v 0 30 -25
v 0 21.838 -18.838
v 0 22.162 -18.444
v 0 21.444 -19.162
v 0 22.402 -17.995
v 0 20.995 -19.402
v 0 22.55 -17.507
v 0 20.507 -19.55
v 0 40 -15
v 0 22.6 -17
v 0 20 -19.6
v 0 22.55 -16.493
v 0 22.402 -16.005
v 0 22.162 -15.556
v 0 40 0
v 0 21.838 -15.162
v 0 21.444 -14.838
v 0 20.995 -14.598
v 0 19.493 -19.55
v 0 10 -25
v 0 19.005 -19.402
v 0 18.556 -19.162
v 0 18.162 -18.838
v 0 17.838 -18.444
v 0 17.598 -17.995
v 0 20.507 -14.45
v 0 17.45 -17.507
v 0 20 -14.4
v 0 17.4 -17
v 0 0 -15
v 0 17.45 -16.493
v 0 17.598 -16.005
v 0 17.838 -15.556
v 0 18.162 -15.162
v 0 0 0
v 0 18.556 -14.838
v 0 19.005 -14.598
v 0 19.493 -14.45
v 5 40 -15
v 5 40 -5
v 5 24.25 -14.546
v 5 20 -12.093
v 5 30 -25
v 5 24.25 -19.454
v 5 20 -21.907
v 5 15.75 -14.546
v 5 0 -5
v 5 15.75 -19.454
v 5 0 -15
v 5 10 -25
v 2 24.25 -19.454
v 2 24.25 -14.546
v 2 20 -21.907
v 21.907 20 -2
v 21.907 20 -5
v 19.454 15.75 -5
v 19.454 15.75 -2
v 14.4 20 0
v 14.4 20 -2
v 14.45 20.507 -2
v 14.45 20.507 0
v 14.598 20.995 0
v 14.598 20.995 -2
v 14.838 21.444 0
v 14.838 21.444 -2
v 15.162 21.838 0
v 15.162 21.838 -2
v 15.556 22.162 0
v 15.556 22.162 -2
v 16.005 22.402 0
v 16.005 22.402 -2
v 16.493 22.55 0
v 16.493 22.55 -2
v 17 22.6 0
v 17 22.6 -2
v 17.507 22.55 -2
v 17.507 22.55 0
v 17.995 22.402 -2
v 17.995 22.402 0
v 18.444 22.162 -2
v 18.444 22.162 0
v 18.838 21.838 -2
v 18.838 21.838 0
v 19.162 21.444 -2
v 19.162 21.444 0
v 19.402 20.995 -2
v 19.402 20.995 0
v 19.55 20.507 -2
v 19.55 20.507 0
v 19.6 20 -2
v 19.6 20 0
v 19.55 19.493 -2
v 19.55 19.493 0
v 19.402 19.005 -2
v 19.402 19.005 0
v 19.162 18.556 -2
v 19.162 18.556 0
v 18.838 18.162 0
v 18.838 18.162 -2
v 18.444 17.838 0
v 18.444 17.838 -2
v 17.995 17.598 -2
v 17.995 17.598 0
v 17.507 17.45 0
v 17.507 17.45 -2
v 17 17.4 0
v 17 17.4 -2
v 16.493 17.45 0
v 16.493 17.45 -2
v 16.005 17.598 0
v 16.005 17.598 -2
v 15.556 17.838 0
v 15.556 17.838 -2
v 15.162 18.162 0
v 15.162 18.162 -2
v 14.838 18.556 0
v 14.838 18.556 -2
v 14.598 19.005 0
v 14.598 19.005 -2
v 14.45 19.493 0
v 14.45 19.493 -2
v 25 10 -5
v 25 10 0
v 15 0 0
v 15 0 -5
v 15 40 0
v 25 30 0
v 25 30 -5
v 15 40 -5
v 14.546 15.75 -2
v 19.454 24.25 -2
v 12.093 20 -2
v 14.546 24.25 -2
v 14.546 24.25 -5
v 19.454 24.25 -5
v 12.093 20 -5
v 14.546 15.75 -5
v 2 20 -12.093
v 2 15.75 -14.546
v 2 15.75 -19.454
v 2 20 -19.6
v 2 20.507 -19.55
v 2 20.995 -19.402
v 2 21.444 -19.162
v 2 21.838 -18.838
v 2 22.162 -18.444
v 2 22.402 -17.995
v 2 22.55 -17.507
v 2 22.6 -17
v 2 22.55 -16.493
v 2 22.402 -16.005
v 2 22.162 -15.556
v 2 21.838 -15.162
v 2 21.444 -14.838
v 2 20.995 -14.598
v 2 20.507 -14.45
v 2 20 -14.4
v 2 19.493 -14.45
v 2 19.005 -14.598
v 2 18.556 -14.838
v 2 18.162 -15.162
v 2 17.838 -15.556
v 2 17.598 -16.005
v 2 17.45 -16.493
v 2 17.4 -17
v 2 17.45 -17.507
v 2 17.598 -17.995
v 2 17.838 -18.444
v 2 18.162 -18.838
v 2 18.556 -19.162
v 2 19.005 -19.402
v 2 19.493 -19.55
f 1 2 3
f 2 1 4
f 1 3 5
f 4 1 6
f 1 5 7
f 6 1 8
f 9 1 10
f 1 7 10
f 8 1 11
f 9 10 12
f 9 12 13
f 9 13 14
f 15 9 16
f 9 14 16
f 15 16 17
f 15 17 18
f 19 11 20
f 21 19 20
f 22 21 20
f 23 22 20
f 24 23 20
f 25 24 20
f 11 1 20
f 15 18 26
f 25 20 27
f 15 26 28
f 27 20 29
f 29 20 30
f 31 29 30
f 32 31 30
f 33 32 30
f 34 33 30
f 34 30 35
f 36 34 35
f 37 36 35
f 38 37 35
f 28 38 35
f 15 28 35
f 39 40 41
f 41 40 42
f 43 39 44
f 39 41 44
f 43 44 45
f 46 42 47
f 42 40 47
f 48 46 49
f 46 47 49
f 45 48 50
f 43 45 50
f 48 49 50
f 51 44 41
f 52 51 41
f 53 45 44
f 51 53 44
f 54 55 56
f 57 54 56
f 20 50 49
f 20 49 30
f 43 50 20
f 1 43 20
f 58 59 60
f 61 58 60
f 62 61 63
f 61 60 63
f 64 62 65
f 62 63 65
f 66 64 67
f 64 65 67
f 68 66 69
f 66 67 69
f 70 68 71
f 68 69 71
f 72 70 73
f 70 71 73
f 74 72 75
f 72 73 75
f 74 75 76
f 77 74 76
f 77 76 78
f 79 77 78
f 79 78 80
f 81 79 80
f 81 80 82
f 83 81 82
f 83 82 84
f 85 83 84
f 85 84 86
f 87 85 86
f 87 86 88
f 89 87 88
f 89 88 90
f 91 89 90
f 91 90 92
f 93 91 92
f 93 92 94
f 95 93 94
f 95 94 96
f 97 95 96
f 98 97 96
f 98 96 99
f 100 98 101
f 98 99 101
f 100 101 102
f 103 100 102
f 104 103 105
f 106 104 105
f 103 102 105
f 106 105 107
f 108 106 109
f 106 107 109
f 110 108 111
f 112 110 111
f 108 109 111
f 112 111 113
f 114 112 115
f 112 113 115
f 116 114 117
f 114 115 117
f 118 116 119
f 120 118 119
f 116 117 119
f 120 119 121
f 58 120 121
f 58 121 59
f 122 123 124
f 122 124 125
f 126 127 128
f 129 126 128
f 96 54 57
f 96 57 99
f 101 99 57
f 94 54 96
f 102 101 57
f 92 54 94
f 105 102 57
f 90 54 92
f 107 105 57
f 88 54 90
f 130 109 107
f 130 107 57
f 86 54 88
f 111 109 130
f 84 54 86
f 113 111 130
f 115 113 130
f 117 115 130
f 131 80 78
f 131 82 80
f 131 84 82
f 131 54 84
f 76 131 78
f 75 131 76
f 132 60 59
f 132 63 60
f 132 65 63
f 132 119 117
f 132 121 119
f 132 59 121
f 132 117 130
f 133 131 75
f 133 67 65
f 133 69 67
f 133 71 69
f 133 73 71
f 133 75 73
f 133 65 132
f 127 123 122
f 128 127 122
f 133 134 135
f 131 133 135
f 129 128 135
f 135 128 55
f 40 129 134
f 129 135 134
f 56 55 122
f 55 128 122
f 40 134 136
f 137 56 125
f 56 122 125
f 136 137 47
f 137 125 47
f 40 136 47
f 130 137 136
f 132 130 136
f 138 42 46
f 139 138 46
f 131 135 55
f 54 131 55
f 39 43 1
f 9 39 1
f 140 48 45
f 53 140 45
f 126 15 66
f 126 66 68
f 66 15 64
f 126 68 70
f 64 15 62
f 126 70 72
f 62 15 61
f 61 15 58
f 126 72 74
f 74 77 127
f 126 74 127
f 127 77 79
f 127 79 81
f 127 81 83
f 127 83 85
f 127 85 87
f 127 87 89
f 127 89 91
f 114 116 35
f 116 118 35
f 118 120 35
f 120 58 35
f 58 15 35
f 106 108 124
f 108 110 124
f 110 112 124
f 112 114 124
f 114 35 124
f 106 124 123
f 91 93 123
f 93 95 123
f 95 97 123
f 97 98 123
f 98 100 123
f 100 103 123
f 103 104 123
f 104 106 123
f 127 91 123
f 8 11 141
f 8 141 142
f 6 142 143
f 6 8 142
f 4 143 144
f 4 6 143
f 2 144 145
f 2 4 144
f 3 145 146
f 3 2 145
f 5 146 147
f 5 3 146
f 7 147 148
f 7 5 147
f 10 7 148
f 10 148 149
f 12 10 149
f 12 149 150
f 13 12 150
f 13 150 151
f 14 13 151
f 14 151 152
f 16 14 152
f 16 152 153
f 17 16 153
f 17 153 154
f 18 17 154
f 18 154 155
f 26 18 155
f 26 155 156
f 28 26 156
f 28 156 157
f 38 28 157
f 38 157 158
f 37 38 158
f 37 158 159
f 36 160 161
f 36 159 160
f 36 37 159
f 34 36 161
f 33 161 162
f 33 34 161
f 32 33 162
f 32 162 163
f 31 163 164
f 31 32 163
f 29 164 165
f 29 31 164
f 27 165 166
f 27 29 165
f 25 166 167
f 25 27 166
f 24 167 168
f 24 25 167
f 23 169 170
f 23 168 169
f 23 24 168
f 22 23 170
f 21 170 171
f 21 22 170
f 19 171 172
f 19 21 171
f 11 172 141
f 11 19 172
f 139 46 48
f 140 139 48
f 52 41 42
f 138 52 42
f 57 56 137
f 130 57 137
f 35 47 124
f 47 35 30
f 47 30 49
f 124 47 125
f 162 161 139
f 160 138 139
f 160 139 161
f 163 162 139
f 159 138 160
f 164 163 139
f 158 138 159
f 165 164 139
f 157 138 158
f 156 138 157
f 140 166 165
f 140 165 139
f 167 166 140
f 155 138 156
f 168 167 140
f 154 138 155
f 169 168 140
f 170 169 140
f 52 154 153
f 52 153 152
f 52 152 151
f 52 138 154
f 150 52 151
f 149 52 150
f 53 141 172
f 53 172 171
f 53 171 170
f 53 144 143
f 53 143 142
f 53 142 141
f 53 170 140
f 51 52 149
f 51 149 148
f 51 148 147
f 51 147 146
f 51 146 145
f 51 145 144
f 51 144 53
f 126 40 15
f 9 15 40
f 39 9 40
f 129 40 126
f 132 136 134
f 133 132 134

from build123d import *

# Parameters (mm, degrees)
BOSS_EXTRUDE1_DEPTH     = 40
SKETCH2_R               = 2.6
CUT_EXTRUDE1_DEPTH      = 40
CUT_EXTRUDE2_DEPTH      = 3
CUT_EXTRUDE3_DEPTH      = 52.23475383
CUT_EXTRUDE3_DEPTH_BACK = 52.23475383
SKETCH4_R               = 2.6
CUT_EXTRUDE4_DEPTH      = 3
CHAMFER1_SIZE           = 10


with BuildPart() as part:
    # Sketch1 → Boss-Extrude1 (new body)
    with BuildSketch(Plane(origin=(0, 0, 0), x_dir=(1, 0, 0), z_dir=(0, 1, 0))):
        Polygon((0, 0), (25, 0), (25, 5), (5, 5), (5, 25), (0, 25), align=None)
    extrude(amount=BOSS_EXTRUDE1_DEPTH)

    # Sketch2 → Cut-Extrude1 (cut)
    with BuildSketch(Plane(origin=(0, 0, -5), x_dir=(-1, 0, 0), z_dir=(0, 0, -1))):
        with Locations((-17, 20)):
            Circle(SKETCH2_R)
    extrude(amount=-CUT_EXTRUDE1_DEPTH, mode=Mode.SUBTRACT)

    # Sketch3 → Cut-Extrude2 (cut)
    with BuildSketch(Plane(origin=(0, 0, -5), x_dir=(-1, 0, 0), z_dir=(0, 0, -1))):
        Polygon((-14.546261356, 24.25), (-19.453738644, 24.25), (-21.907477288, 20), (-19.453738644, 15.75), (-14.546261356, 15.75), (-12.092522712, 20), align=None)
    extrude(amount=-CUT_EXTRUDE2_DEPTH, mode=Mode.SUBTRACT)

    # Sketch4 → Cut-Extrude3 (cut, two sides: drawn at the far end of the back side and taken through both)
    with BuildSketch(Plane(origin=(5, 0, 0), x_dir=(0, 0, -1), z_dir=(1, 0, 0)).offset(-CUT_EXTRUDE3_DEPTH_BACK)):
        with Locations((17, 20)):
            Circle(SKETCH4_R)
    extrude(amount=CUT_EXTRUDE3_DEPTH + CUT_EXTRUDE3_DEPTH_BACK, mode=Mode.SUBTRACT)

    # Sketch5 → Cut-Extrude4 (cut)
    with BuildSketch(Plane(origin=(5, 0, 0), x_dir=(0, 0, -1), z_dir=(1, 0, 0))):
        Polygon((19.453738644, 24.25), (14.546261356, 24.25), (12.092522712, 20), (14.546261356, 15.75), (19.453738644, 15.75), (21.907477288, 20), align=None)
    extrude(amount=-CUT_EXTRUDE4_DEPTH, mode=Mode.SUBTRACT)

    # Chamfer1
    chamfer1_edges = [part.edges().sort_by_distance(p)[0] for p in [
        (25, 40, -2.5),
        (2.5, 40, -25),
        (2.5, 0, -25),
        (25, 0, -2.5),
    ]]
    chamfer(chamfer1_edges, length=CHAMFER1_SIZE)


solid = part.part
